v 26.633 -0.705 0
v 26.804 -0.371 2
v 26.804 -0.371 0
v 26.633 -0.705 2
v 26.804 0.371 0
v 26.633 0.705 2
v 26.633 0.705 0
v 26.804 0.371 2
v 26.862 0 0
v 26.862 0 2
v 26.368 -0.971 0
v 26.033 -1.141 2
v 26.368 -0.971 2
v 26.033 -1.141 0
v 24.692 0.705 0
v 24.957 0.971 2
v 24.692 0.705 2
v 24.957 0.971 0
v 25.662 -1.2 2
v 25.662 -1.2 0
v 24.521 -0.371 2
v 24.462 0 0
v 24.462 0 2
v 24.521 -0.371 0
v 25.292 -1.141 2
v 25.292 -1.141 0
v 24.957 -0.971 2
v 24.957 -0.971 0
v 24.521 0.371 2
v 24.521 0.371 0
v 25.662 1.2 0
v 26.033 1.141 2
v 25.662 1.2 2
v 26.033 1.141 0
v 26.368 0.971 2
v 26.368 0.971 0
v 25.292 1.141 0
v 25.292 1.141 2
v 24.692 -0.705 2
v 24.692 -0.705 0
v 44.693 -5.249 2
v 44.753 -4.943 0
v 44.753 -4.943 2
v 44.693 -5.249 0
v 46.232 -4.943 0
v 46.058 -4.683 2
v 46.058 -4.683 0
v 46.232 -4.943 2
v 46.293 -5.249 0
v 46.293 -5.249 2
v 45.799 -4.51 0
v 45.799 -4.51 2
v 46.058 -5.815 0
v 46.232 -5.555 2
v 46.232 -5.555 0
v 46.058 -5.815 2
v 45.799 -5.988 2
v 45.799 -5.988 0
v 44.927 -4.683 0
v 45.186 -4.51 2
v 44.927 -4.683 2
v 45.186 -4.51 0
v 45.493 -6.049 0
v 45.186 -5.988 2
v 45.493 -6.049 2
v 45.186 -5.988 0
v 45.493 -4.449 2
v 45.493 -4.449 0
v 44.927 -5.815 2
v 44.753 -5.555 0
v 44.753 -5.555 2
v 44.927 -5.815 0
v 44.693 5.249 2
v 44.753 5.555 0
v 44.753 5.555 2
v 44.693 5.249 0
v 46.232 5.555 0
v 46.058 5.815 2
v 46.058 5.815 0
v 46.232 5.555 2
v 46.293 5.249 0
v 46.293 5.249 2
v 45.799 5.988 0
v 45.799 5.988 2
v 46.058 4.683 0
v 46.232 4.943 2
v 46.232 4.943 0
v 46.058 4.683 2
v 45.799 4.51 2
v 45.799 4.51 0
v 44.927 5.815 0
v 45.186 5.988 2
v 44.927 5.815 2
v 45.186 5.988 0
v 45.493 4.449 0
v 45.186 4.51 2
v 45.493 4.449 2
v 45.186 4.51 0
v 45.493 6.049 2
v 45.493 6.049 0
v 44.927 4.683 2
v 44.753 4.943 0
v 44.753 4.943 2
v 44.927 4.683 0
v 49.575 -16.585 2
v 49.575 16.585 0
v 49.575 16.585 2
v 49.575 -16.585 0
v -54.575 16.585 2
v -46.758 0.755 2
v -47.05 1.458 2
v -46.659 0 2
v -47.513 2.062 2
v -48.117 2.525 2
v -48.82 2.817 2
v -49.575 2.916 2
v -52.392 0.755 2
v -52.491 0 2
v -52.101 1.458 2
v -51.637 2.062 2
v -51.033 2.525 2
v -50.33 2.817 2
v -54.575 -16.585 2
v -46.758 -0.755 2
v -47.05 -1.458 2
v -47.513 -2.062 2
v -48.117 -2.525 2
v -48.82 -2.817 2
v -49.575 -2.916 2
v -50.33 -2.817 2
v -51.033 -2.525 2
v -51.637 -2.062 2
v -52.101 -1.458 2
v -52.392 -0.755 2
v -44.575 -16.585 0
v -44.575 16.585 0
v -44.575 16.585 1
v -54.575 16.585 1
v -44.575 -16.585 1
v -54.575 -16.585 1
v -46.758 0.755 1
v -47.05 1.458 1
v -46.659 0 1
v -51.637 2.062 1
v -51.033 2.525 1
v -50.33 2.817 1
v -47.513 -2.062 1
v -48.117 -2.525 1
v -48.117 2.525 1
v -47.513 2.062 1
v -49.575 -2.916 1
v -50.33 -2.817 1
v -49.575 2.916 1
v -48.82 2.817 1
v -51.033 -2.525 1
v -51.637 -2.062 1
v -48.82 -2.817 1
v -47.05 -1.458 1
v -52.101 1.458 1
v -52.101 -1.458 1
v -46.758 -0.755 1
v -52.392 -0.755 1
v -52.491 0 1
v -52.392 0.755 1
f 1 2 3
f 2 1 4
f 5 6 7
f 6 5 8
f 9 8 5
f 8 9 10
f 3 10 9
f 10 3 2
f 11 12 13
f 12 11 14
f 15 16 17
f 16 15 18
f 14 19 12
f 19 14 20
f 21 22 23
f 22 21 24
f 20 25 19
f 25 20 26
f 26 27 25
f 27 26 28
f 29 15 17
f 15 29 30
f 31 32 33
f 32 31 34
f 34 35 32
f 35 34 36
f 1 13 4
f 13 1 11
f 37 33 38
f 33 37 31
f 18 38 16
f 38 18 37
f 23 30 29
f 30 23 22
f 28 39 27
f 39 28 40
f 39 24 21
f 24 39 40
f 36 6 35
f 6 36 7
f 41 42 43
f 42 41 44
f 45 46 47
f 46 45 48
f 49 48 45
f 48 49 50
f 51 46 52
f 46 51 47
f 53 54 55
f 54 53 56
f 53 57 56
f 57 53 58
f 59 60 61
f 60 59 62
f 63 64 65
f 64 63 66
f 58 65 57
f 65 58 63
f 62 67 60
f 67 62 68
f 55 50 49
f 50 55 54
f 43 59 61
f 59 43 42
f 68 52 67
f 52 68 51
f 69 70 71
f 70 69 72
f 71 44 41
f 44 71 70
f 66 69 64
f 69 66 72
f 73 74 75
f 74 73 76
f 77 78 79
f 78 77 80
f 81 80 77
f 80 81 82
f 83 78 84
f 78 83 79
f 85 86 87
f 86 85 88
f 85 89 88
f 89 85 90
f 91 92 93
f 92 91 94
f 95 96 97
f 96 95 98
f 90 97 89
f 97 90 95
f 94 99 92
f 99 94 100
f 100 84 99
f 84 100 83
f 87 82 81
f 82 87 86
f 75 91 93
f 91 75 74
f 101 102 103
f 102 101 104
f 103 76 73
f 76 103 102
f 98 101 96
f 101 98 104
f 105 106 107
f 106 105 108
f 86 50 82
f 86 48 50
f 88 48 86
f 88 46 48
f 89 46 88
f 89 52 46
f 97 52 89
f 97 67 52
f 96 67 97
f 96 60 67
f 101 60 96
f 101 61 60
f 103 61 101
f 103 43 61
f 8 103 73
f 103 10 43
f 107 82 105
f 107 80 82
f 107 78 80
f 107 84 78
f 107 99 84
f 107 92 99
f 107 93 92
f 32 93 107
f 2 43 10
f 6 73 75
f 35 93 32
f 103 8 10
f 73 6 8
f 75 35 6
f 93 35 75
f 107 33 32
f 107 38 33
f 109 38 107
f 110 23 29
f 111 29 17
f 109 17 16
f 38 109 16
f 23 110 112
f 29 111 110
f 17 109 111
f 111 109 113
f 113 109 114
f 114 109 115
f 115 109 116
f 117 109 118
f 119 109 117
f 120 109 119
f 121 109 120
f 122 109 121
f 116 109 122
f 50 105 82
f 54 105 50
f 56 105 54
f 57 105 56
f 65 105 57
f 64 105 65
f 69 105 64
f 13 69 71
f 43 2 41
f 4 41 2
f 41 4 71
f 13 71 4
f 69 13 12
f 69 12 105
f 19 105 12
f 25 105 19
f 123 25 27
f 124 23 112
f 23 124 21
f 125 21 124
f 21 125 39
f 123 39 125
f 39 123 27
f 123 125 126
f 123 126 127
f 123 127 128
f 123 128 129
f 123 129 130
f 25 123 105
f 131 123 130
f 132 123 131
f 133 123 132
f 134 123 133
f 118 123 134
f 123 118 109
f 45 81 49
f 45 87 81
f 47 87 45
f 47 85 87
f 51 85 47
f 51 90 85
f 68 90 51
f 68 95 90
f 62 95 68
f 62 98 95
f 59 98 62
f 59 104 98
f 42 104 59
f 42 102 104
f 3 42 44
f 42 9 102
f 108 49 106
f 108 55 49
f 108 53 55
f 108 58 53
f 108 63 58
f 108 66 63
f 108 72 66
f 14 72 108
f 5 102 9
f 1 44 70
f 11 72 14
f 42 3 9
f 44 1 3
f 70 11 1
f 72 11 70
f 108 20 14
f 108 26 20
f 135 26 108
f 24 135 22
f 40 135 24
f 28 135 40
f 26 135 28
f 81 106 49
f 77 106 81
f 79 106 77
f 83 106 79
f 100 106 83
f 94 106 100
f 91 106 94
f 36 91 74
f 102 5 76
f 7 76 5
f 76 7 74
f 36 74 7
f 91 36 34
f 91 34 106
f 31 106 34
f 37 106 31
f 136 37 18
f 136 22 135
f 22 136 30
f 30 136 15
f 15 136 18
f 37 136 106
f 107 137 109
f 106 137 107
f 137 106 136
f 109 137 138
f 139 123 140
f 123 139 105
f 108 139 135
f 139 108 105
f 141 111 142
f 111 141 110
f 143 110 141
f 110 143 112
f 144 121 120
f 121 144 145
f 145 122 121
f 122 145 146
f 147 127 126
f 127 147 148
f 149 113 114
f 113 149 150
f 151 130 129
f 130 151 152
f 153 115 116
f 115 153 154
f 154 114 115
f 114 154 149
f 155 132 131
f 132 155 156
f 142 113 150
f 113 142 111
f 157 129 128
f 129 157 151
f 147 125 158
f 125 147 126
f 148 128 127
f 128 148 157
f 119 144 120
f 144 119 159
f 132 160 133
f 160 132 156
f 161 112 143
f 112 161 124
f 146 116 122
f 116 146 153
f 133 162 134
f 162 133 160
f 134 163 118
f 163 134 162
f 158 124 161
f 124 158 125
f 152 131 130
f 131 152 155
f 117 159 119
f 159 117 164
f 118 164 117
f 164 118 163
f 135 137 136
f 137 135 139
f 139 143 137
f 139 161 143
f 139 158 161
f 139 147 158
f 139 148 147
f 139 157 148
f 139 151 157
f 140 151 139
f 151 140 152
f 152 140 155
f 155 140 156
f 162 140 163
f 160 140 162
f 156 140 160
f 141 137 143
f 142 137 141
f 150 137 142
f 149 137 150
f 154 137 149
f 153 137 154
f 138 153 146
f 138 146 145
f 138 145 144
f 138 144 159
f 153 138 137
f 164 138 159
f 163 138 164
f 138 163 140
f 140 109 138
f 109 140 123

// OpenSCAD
// file: ../../library/e7_all.scad
// ==========================================================================
//  e7_all.scad - include this one file. Preview, print plates and the report.
// ==========================================================================
include <e7_params.scad>
include <e7_body.scad>

// whole painted loco
module e7_preview() {
  // carbody in its paint bands
  for (i = [0:len(PAINT_BANDS) - 1]) {
    z0 = i == 0 ? -1 : p(PAINT_BANDS[i - 1][0]);
    z1 = i == len(PAINT_BANDS) - 1 ? 1000 : p(PAINT_BANDS[i][0]);
    color(PAINT_BANDS[i][1]) render(convexity = 8) e7_shell_solid([z0, z1]);
  }
  color(C_GLASS) e7_glass();
  color(C_LENS) let (d = nose_d_at_z(HEADLIGHT[0]))
    translate([XF - p(d) + p(HEADLIGHT[2]) + p(1.5), 0, p(HEADLIGHT[0])]) rotate([0, 90, 0]) cylinder(d = p(HEADLIGHT[1]) - 0.8, h = 0.5, $fn = 32);
  color(C_FRAME) { for (j = [1:NFRAME]) e7_frame_piece(j); e7_pilot(); e7_pilot_rear(); }
  for (tx = [TRK_X, -TRK_X]) translate([tx, 0, 0]) { color(C_TRUCK) e7_truck_frame(); color(C_WHEEL) e7_wheels(); }
}
// thin glass panes sitting in the window pockets (preview only)
module e7_glass() {
  intersection() { e7_loft(DET * 0.6); union() { e7_windshield_cut(); e7_side_cuts_windows_only(); } }
}
module e7_side_cuts_windows_only() {
  for (s = [-1, 1], w = CAB_WIN)
    translate([XF - p(w[1]), s * HW - (s > 0 ? DET : 3 - DET), p(w[2])]) cube([p(w[1] - w[0]), 3, p(w[3] - w[2])]);
}

// one print, laid out for the printer
module e7_plate(part) {
  sec = [for (k = [1:NSEC]) str("body_", k)];
  frm = [for (j = [1:NFRAME]) str("frame_", j)];
  if (is_num(search([part], sec)[0])) {
    k = search([part], sec)[0] + 1;
    // stand the section on its open bottom (skirt edge on the bed)
    translate([-sec_x0(k) - SEC_L / 2, 0, -Z_SKIRT]) e7_body_section(k);
  } else if (is_num(search([part], frm)[0])) {
    j = search([part], frm)[0] + 1;
    xs = concat([FRAME_X0], FRAME_SPLITS, [FRAME_X1]);
    translate([-(xs[j - 1] + xs[j]) / 2, 0, -Z_FRAME_BOT]) e7_frame_piece(j);
  } else if (part == "pilot") {
    translate([-XF, 0, 0]) rotate([0, 0, 0]) translate([0, 0, -p(5)]) e7_pilot();
  } else if (part == "pilot_rear") {
    translate([-XR, 0, 0]) translate([0, 0, -(CPL_Z - CPL_H / 2 - WALL)]) e7_pilot_rear();
  } else if (part == "truck") {
    // upside down, bolster on the bed
    translate([0, 0, Z_FRAME_BOT - 0.3]) rotate([180, 0, 0]) e7_truck_frame();
  } else {
    assert(false, str("unknown part '", part, "'"));
  }
}

module e7_report() {
  echo(str("MILW E7A ", ROAD_NO, " class ", CLASS, " - ", SC, " scale 1:", RATIO, ", paint ", PAINT));
  echo(str("  carbody ", round(BL), " mm long, ", round(2 * HW), " mm wide, roof ", round(Z_ROOF), " mm, cab ", round(Z_CAB), " mm above rail"));
  echo(str("  ", NSEC, " body sections of ", round(SEC_L), " mm; ", NFRAME, " frame pieces; trucks at +/- ", round(TRK_X), " mm"));
  echo(str("  body screws ", SCREW_BODY_NAME, " x ", 2 * len(BOSS_X), "; truck pivots ", PIVOT[1], "; wheels ", round(WHEEL_D * 10) / 10, " mm (bought)"));
}
// main file
// Milwaukee Road E7A, HO scale 1-87 - print 3 of 6: frame_2 - frame plate piece 2 (front; print flat)
// Render (F6), export STL, print. Settings: ../../library/e7_params.scad
// Whole loco preview and notes: ../../MILW_E7_Main.scad
SCALE_SEL = "HO";
include <../../library/e7_all.scad>
e7_plate("frame_2");
